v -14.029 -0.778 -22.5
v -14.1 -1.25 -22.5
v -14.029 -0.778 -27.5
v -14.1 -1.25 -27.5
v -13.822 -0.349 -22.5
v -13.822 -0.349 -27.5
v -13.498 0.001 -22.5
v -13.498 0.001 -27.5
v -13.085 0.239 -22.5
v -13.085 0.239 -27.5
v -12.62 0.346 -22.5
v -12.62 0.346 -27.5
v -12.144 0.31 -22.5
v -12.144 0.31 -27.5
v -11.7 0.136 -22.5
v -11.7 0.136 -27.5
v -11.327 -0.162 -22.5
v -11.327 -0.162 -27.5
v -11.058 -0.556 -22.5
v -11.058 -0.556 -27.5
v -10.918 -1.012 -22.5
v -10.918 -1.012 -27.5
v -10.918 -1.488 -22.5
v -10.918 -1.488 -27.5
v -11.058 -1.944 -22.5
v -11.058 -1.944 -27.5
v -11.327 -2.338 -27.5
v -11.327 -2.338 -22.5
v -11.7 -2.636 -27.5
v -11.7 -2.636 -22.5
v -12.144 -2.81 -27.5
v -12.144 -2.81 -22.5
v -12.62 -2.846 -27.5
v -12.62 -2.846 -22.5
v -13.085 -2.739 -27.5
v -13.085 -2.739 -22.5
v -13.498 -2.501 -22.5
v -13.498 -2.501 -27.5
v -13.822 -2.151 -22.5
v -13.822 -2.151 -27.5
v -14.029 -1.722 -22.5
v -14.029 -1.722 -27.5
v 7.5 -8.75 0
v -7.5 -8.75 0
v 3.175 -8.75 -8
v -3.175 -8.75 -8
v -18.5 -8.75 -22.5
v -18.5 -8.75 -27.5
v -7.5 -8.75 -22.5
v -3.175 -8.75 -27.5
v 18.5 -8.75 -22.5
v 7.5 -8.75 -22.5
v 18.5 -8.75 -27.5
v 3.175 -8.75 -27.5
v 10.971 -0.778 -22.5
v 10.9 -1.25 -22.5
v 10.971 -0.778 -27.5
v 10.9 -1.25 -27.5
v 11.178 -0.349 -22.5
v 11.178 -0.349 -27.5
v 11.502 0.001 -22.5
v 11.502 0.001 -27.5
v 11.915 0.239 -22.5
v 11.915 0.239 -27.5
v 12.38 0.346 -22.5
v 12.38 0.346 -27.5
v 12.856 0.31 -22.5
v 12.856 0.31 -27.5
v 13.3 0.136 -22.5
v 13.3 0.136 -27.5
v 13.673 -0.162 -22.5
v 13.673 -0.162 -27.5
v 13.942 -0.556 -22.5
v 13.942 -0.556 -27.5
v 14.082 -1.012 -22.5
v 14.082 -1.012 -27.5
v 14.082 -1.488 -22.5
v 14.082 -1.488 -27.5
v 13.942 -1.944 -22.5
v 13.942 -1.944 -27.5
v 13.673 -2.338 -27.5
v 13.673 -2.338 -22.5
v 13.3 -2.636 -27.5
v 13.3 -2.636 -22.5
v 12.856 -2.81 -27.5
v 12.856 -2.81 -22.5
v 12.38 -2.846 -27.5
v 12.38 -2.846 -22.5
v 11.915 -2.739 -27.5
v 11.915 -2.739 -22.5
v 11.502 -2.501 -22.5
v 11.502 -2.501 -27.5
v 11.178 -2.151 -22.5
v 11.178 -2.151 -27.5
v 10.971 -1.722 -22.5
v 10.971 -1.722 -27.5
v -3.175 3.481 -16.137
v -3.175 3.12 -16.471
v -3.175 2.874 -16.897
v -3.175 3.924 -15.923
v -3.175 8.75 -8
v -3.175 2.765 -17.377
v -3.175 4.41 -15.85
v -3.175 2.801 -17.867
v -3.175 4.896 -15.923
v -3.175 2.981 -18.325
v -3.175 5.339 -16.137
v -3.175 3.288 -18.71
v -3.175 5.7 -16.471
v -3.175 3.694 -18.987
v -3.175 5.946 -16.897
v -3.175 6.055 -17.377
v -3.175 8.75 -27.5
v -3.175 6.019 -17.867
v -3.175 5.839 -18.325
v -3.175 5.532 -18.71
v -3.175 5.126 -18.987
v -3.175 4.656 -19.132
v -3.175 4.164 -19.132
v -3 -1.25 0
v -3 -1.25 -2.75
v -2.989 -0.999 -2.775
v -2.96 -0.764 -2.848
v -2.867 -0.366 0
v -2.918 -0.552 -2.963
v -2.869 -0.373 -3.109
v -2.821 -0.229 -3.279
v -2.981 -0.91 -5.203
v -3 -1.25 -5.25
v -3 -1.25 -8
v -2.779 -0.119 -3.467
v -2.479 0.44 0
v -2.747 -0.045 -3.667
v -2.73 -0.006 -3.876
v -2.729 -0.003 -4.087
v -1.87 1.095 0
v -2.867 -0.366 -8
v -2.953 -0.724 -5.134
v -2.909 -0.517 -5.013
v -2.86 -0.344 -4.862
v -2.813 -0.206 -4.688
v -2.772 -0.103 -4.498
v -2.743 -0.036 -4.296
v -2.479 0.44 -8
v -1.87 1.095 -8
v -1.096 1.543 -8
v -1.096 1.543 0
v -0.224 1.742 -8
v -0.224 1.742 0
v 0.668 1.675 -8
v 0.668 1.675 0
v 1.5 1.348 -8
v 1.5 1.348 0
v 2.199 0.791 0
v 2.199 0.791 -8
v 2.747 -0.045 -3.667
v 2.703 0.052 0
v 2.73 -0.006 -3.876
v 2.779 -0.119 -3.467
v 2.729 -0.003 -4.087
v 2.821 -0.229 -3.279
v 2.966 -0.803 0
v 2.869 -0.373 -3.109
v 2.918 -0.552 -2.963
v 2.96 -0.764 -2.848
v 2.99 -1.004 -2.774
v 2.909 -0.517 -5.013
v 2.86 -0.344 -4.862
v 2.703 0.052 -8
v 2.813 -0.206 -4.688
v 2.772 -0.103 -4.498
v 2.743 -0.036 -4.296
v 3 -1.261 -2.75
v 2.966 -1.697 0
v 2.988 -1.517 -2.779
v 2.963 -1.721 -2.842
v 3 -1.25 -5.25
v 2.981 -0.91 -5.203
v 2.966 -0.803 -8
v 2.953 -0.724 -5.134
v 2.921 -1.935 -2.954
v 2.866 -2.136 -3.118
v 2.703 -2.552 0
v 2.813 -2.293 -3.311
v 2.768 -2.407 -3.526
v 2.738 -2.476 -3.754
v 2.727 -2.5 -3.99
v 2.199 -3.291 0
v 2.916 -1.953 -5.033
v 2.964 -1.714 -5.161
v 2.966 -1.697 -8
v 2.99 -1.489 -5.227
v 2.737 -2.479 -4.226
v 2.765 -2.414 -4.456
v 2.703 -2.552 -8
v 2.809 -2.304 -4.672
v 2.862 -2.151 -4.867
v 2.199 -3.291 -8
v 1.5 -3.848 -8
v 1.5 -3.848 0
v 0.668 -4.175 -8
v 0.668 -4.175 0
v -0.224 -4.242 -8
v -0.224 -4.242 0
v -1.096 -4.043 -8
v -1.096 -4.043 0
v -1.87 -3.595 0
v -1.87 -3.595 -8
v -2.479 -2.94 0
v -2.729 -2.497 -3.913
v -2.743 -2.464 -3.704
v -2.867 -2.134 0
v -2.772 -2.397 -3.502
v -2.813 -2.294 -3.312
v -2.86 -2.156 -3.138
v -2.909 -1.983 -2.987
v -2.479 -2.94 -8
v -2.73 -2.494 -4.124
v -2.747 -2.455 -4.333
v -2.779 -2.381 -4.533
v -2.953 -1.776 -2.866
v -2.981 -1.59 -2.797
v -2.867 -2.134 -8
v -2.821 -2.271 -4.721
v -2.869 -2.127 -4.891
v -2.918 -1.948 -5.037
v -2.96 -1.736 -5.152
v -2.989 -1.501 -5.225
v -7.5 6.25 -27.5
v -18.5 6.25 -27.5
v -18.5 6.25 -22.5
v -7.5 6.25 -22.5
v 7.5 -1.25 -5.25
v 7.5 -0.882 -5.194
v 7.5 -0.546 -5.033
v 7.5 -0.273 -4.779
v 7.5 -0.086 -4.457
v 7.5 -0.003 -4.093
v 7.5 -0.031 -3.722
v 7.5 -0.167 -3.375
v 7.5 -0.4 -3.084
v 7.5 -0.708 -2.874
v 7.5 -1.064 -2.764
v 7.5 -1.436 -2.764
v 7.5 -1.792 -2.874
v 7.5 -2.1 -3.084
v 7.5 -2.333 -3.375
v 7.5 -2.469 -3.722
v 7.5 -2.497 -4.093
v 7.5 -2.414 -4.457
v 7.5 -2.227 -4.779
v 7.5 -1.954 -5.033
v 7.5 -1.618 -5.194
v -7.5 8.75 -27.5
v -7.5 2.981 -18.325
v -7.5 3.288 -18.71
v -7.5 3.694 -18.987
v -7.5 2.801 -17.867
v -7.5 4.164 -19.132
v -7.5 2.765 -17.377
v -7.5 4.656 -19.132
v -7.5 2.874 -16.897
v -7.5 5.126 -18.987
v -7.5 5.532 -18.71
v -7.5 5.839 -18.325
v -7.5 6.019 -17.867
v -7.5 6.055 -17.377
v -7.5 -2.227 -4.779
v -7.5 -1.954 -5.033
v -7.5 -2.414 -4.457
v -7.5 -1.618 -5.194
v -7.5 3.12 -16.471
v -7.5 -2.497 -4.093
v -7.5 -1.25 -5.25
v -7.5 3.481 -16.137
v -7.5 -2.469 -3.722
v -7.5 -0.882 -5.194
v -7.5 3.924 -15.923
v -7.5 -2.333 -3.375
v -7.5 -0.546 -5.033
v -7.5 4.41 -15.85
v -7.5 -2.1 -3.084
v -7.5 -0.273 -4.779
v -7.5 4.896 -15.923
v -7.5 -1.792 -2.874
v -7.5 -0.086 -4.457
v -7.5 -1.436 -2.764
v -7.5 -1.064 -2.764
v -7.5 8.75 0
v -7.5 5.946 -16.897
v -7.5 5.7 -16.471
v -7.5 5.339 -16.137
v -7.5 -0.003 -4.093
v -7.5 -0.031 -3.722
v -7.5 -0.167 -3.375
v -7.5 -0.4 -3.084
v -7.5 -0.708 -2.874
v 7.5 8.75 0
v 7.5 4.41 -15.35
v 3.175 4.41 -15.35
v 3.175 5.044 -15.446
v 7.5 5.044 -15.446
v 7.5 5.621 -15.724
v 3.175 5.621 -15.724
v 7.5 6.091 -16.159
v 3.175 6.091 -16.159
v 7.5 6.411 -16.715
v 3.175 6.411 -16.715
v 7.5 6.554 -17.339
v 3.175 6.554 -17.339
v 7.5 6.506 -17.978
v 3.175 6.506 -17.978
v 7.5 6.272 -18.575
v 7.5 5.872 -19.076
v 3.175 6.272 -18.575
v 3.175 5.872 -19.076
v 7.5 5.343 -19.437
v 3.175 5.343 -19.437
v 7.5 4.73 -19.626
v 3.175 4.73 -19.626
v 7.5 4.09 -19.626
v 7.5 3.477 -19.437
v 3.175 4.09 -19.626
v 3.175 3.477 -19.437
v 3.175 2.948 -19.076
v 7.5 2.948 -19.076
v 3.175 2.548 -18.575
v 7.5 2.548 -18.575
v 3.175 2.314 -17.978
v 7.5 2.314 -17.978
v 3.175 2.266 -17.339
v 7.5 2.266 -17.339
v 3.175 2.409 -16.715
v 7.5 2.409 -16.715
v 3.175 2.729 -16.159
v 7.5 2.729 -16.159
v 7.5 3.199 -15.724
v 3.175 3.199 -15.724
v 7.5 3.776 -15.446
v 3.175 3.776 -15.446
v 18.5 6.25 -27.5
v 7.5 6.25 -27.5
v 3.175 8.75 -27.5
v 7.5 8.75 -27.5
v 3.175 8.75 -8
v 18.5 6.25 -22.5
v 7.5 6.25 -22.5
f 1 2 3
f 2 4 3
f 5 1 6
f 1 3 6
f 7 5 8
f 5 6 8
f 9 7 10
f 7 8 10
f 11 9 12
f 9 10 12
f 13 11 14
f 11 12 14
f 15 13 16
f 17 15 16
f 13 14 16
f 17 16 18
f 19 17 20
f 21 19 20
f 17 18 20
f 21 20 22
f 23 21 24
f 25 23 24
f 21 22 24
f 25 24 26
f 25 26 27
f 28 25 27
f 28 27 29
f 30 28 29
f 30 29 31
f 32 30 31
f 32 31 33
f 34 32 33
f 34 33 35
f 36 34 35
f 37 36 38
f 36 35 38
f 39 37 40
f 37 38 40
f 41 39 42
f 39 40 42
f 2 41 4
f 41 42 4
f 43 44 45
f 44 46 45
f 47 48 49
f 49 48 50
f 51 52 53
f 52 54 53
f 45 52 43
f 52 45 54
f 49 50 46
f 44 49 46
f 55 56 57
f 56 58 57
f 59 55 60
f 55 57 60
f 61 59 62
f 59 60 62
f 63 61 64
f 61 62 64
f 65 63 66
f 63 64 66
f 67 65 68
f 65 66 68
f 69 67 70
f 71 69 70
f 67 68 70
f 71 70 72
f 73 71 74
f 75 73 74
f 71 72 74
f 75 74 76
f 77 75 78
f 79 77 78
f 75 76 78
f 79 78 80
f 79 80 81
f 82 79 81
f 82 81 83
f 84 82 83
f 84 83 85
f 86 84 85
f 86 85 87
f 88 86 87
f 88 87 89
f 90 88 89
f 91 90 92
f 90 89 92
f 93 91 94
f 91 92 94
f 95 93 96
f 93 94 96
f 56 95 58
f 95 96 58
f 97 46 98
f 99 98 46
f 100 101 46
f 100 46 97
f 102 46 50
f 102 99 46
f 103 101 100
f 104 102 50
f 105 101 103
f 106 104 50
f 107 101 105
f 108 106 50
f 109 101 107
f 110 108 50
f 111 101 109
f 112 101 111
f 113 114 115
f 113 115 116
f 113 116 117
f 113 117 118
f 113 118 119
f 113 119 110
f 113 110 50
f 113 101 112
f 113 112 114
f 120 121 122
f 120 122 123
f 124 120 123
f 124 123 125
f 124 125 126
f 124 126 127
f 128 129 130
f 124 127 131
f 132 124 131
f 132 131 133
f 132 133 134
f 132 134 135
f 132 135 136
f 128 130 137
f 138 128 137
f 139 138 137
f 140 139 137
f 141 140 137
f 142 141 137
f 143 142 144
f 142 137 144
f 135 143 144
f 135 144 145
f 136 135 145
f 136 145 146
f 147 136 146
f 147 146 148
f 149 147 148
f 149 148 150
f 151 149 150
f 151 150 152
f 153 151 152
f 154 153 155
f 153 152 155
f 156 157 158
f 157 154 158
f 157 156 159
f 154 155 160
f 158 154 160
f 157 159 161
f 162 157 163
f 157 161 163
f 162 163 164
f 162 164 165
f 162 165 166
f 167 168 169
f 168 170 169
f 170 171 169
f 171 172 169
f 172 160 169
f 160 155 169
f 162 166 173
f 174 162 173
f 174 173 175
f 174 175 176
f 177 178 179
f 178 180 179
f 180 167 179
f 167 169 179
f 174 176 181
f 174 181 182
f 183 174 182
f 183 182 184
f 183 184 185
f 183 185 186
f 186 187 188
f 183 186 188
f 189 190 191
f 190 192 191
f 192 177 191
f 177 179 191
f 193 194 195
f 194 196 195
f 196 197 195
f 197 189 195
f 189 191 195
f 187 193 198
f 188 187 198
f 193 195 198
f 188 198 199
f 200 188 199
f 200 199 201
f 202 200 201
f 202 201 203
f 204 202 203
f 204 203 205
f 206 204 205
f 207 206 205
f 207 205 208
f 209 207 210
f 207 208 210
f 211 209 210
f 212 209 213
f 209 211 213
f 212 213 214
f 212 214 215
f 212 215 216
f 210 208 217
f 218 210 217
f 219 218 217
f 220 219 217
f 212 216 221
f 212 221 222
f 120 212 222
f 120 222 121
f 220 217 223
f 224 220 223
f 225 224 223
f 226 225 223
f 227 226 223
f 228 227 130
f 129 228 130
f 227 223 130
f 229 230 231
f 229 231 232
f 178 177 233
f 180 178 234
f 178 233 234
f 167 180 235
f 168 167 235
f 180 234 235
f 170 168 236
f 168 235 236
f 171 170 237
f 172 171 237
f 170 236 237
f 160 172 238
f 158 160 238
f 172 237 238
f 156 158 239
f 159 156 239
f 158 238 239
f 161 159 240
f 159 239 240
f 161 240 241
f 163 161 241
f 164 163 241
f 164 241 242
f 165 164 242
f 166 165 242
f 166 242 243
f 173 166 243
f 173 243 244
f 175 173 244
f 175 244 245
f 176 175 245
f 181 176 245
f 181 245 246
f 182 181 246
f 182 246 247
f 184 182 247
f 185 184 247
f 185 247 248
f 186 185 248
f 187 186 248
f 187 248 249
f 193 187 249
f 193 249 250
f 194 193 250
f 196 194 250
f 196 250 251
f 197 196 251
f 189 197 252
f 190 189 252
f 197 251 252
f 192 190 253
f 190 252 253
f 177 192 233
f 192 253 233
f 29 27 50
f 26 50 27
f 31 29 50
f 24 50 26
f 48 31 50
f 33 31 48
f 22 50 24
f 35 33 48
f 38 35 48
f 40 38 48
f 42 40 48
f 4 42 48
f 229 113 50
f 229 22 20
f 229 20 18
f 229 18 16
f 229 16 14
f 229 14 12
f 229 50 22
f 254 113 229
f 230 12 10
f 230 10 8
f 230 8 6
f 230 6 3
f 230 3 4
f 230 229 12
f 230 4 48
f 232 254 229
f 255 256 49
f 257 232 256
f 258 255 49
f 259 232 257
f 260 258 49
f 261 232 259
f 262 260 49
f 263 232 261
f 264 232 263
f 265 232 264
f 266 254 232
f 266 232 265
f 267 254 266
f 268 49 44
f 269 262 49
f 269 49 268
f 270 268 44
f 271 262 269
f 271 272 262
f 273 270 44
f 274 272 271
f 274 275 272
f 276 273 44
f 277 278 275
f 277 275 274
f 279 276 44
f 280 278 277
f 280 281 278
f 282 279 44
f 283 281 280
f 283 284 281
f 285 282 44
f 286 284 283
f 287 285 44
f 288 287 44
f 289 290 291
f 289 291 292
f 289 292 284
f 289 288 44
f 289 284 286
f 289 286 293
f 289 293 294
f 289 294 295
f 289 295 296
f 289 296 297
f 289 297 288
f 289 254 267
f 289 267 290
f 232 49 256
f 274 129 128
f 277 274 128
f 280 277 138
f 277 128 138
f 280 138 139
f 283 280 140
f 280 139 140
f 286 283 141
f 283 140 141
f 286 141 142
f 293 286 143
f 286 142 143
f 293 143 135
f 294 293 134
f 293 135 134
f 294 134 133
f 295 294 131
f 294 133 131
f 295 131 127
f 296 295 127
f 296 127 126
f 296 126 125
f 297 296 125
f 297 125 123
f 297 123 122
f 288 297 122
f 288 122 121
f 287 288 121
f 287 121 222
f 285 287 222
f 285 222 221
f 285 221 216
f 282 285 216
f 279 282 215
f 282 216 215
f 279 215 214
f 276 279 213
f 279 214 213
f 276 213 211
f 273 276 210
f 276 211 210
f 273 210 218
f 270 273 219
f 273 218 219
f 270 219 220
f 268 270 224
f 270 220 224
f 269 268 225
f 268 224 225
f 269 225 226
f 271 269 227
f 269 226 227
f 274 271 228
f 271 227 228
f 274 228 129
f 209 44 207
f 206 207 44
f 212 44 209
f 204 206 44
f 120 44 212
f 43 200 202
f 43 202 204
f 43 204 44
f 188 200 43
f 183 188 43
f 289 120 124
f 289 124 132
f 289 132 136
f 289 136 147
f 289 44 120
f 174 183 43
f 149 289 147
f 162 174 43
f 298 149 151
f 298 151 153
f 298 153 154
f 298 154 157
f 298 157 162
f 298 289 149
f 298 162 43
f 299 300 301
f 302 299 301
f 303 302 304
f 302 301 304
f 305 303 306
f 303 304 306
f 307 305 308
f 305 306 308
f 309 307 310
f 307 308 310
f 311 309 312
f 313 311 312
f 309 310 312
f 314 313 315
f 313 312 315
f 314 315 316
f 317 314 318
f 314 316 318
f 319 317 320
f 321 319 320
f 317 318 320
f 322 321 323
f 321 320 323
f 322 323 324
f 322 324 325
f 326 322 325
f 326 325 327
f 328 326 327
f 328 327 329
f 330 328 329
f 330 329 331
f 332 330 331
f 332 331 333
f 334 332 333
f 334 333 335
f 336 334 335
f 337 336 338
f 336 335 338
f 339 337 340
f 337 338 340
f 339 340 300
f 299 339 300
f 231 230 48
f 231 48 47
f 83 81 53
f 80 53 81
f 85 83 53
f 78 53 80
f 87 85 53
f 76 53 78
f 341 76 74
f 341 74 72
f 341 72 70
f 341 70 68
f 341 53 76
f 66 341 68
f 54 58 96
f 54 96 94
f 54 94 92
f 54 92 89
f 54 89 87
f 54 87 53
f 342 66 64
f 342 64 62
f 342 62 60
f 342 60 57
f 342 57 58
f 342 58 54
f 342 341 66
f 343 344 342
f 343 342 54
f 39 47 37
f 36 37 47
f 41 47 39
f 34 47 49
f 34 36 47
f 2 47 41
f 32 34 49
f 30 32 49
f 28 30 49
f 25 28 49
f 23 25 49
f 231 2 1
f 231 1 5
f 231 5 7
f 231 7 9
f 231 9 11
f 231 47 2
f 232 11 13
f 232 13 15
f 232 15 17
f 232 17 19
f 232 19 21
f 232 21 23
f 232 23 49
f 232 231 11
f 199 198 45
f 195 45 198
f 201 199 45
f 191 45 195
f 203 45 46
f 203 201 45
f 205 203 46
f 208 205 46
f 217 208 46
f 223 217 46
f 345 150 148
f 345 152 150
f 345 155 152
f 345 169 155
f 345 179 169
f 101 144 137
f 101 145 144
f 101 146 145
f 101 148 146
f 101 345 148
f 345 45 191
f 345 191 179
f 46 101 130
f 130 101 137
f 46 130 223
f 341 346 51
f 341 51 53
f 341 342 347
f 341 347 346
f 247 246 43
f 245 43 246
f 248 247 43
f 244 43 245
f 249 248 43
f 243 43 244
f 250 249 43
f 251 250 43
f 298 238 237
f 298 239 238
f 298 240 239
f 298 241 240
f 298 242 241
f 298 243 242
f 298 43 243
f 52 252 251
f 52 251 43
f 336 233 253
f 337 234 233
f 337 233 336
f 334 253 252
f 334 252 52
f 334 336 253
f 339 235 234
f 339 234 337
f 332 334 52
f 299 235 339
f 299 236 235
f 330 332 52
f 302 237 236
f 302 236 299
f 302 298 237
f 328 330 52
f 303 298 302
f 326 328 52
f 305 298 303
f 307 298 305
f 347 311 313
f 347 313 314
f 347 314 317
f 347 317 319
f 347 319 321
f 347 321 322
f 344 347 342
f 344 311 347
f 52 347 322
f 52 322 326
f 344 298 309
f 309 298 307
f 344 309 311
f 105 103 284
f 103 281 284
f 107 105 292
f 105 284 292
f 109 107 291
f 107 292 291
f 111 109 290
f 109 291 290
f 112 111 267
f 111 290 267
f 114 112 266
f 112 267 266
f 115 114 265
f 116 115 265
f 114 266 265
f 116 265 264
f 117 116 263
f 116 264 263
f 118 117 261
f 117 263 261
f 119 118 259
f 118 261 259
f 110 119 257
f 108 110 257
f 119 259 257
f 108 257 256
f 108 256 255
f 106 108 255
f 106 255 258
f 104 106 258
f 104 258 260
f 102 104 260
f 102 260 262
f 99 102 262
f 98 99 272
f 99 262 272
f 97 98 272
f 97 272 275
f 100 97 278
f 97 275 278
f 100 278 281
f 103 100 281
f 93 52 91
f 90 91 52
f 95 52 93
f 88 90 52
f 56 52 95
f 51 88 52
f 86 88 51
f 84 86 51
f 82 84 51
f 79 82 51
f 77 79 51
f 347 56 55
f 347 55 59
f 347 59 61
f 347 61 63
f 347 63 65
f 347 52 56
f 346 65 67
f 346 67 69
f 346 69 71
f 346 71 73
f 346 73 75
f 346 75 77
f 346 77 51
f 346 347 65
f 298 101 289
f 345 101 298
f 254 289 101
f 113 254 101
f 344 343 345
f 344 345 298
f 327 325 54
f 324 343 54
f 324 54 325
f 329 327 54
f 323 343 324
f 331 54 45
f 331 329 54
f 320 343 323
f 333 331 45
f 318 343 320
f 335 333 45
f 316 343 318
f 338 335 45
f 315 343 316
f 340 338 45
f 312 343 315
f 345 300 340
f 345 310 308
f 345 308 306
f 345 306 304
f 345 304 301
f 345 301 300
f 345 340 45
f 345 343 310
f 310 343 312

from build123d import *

# Parameters (mm, degrees)
BOSS_EXTRUDE1_DEPTH             = 8.75
F_6_0_6_DIAMETER_HOLE1_D        = 6
TAP_DRILL_FOR_M3X0_5_TAP1_D     = 2.5
M3_CLEARANCE_HOLE1_D            = 3.2
M3_CLEARANCE_HOLE1_DEPTH        = 5
M3_CLEARANCE_HOLE1_TIP          = 0.96137699
M4_CLEARANCE_HOLE1_D            = 4.3
M4_CLEARANCE_HOLE1_DEPTH        = 4.325
M4_CLEARANCE_HOLE1_TIP          = 1.291850331
TAP_DRILL_FOR_M4X0_7_TAP1_D     = 3.3
TAP_DRILL_FOR_M4X0_7_TAP1_DEPTH = 4.325
TAP_DRILL_FOR_M4X0_7_TAP1_TIP   = 0.991420021
CUT_EXTRUDE1_DEPTH              = 31.414840202
CUT_EXTRUDE1_DEPTH_BACK         = 31.414840202
SKETCH16_W                      = 11
SKETCH16_H                      = 2.5


with BuildPart() as part:
    # Sketch1 → Boss-Extrude1 (new, symmetric)
    with BuildSketch(Plane(origin=(0, 0, 0), x_dir=(1, 0, 0), z_dir=(0, 1, 0))):
        Polygon((-7.5, 0), (7.5, 0), (7.5, 22.5), (18.5, 22.5), (18.5, 27.5), (3.175, 27.5), (3.175, 11.175), (3.175, 8), (0, 8), (-3.175, 8), (-3.175, 11.175), (-3.175, 27.5), (-18.5, 27.5), (-18.5, 22.5), (-7.5, 22.5), align=None)
    extrude(amount=BOSS_EXTRUDE1_DEPTH, both=True)

    # Ø6.0 (6) Diameter Hole1 (through all)
    with Locations(Plane.XY):
        with Locations((0, -1.25)):
            Hole(F_6_0_6_DIAMETER_HOLE1_D / 2)

    # Tap Drill for M3x0.5 Tap1 (through all)
    with Locations(Plane.ZY.offset(7.5)):
        with Locations((-4, -1.25)):
            Hole(TAP_DRILL_FOR_M3X0_5_TAP1_D / 2)

    # M3 Clearance Hole1
    with Locations(Plane.XY.offset(-22.5)):
        with Locations((12.5, -1.25), (-12.5, -1.25)):
            Hole(M3_CLEARANCE_HOLE1_D / 2, depth=M3_CLEARANCE_HOLE1_DEPTH)
            with Locations((0, 0, -(M3_CLEARANCE_HOLE1_DEPTH + M3_CLEARANCE_HOLE1_TIP / 2))):  # 118° drill point
                Cone(0, M3_CLEARANCE_HOLE1_D / 2, M3_CLEARANCE_HOLE1_TIP, mode=Mode.SUBTRACT)

    # M4 Clearance Hole1
    with Locations(Plane(origin=(7.5, 0, 0), x_dir=(0, 0, -1), z_dir=(1, 0, 0))):
        with Locations((17.5, 4.41)):
            Hole(M4_CLEARANCE_HOLE1_D / 2, depth=M4_CLEARANCE_HOLE1_DEPTH)
            with Locations((0, 0, -(M4_CLEARANCE_HOLE1_DEPTH + M4_CLEARANCE_HOLE1_TIP / 2))):  # 118° drill point
                Cone(0, M4_CLEARANCE_HOLE1_D / 2, M4_CLEARANCE_HOLE1_TIP, mode=Mode.SUBTRACT)

    # Tap Drill for M4x0.7 Tap1
    with Locations(Plane(origin=(-3.175, 0, 0), x_dir=(0, 0, -1), z_dir=(1, 0, 0))):
        with Locations((17.5, 4.41)):
            Hole(TAP_DRILL_FOR_M4X0_7_TAP1_D / 2, depth=TAP_DRILL_FOR_M4X0_7_TAP1_DEPTH)
            with Locations((0, 0, -(TAP_DRILL_FOR_M4X0_7_TAP1_DEPTH + TAP_DRILL_FOR_M4X0_7_TAP1_TIP / 2))):  # 118° drill point
                Cone(0, TAP_DRILL_FOR_M4X0_7_TAP1_D / 2, TAP_DRILL_FOR_M4X0_7_TAP1_TIP, mode=Mode.SUBTRACT)

    # Sketch16 → Cut-Extrude1 (cut, two sides: drawn at the far end of the back side and taken through both)
    with BuildSketch(Plane.XY.offset(-22.5).offset(-CUT_EXTRUDE1_DEPTH_BACK)):
        with Locations((-13, 7.5)):
            Rectangle(SKETCH16_W, SKETCH16_H)
        with Locations((13, 7.5)):
            Rectangle(SKETCH16_W, SKETCH16_H)
    extrude(amount=CUT_EXTRUDE1_DEPTH + CUT_EXTRUDE1_DEPTH_BACK, mode=Mode.SUBTRACT)


solid = part.part
